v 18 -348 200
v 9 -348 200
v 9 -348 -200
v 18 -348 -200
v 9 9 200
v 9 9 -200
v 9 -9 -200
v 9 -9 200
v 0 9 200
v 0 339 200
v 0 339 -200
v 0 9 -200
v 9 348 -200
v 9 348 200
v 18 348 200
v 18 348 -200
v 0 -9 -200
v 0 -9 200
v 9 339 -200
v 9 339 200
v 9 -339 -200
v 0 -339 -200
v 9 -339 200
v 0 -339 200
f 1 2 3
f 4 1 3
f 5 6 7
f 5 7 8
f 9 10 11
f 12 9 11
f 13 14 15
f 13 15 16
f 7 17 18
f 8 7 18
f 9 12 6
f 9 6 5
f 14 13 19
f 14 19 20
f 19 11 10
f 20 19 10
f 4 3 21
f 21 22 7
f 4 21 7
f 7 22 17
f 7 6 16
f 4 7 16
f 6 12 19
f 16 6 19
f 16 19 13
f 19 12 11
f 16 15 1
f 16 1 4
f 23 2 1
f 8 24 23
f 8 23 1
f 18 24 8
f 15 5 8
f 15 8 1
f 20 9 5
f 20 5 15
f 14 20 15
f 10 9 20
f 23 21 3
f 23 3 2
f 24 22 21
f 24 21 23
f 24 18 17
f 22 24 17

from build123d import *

# Parameters (mm, degrees)
SKETCH1_W           = 400
SKETCH1_H           = 696
BOSS_EXTRUDE1_DEPTH = 18
SKETCH2_W           = 400
SKETCH2_H           = 9
CUT_EXTRUDE1_DEPTH  = 9
SKETCH3_W           = 400
SKETCH3_H           = 18
CUT_EXTRUDE2_DEPTH  = 9


with BuildPart() as part:
    # Sketch1 → Boss-Extrude1 (new body)
    with BuildSketch(Plane(origin=(0, 0, 0), x_dir=(0, 0, -1), z_dir=(1, 0, 0))):
        Rectangle(SKETCH1_W, SKETCH1_H)
    extrude(amount=BOSS_EXTRUDE1_DEPTH)

    # Sketch2 → Cut-Extrude1 (cut)
    with BuildSketch(Plane.ZY):
        with Locations((0, -343.5)):
            Rectangle(SKETCH2_W, SKETCH2_H)
        with Locations((0, 343.5)):
            Rectangle(SKETCH2_W, SKETCH2_H)
    extrude(amount=-CUT_EXTRUDE1_DEPTH, mode=Mode.SUBTRACT)

    # Sketch3 → Cut-Extrude2 (cut)
    with BuildSketch(Plane.ZY):
        Rectangle(SKETCH3_W, SKETCH3_H)
    extrude(amount=-CUT_EXTRUDE2_DEPTH, mode=Mode.SUBTRACT)


solid = part.part
